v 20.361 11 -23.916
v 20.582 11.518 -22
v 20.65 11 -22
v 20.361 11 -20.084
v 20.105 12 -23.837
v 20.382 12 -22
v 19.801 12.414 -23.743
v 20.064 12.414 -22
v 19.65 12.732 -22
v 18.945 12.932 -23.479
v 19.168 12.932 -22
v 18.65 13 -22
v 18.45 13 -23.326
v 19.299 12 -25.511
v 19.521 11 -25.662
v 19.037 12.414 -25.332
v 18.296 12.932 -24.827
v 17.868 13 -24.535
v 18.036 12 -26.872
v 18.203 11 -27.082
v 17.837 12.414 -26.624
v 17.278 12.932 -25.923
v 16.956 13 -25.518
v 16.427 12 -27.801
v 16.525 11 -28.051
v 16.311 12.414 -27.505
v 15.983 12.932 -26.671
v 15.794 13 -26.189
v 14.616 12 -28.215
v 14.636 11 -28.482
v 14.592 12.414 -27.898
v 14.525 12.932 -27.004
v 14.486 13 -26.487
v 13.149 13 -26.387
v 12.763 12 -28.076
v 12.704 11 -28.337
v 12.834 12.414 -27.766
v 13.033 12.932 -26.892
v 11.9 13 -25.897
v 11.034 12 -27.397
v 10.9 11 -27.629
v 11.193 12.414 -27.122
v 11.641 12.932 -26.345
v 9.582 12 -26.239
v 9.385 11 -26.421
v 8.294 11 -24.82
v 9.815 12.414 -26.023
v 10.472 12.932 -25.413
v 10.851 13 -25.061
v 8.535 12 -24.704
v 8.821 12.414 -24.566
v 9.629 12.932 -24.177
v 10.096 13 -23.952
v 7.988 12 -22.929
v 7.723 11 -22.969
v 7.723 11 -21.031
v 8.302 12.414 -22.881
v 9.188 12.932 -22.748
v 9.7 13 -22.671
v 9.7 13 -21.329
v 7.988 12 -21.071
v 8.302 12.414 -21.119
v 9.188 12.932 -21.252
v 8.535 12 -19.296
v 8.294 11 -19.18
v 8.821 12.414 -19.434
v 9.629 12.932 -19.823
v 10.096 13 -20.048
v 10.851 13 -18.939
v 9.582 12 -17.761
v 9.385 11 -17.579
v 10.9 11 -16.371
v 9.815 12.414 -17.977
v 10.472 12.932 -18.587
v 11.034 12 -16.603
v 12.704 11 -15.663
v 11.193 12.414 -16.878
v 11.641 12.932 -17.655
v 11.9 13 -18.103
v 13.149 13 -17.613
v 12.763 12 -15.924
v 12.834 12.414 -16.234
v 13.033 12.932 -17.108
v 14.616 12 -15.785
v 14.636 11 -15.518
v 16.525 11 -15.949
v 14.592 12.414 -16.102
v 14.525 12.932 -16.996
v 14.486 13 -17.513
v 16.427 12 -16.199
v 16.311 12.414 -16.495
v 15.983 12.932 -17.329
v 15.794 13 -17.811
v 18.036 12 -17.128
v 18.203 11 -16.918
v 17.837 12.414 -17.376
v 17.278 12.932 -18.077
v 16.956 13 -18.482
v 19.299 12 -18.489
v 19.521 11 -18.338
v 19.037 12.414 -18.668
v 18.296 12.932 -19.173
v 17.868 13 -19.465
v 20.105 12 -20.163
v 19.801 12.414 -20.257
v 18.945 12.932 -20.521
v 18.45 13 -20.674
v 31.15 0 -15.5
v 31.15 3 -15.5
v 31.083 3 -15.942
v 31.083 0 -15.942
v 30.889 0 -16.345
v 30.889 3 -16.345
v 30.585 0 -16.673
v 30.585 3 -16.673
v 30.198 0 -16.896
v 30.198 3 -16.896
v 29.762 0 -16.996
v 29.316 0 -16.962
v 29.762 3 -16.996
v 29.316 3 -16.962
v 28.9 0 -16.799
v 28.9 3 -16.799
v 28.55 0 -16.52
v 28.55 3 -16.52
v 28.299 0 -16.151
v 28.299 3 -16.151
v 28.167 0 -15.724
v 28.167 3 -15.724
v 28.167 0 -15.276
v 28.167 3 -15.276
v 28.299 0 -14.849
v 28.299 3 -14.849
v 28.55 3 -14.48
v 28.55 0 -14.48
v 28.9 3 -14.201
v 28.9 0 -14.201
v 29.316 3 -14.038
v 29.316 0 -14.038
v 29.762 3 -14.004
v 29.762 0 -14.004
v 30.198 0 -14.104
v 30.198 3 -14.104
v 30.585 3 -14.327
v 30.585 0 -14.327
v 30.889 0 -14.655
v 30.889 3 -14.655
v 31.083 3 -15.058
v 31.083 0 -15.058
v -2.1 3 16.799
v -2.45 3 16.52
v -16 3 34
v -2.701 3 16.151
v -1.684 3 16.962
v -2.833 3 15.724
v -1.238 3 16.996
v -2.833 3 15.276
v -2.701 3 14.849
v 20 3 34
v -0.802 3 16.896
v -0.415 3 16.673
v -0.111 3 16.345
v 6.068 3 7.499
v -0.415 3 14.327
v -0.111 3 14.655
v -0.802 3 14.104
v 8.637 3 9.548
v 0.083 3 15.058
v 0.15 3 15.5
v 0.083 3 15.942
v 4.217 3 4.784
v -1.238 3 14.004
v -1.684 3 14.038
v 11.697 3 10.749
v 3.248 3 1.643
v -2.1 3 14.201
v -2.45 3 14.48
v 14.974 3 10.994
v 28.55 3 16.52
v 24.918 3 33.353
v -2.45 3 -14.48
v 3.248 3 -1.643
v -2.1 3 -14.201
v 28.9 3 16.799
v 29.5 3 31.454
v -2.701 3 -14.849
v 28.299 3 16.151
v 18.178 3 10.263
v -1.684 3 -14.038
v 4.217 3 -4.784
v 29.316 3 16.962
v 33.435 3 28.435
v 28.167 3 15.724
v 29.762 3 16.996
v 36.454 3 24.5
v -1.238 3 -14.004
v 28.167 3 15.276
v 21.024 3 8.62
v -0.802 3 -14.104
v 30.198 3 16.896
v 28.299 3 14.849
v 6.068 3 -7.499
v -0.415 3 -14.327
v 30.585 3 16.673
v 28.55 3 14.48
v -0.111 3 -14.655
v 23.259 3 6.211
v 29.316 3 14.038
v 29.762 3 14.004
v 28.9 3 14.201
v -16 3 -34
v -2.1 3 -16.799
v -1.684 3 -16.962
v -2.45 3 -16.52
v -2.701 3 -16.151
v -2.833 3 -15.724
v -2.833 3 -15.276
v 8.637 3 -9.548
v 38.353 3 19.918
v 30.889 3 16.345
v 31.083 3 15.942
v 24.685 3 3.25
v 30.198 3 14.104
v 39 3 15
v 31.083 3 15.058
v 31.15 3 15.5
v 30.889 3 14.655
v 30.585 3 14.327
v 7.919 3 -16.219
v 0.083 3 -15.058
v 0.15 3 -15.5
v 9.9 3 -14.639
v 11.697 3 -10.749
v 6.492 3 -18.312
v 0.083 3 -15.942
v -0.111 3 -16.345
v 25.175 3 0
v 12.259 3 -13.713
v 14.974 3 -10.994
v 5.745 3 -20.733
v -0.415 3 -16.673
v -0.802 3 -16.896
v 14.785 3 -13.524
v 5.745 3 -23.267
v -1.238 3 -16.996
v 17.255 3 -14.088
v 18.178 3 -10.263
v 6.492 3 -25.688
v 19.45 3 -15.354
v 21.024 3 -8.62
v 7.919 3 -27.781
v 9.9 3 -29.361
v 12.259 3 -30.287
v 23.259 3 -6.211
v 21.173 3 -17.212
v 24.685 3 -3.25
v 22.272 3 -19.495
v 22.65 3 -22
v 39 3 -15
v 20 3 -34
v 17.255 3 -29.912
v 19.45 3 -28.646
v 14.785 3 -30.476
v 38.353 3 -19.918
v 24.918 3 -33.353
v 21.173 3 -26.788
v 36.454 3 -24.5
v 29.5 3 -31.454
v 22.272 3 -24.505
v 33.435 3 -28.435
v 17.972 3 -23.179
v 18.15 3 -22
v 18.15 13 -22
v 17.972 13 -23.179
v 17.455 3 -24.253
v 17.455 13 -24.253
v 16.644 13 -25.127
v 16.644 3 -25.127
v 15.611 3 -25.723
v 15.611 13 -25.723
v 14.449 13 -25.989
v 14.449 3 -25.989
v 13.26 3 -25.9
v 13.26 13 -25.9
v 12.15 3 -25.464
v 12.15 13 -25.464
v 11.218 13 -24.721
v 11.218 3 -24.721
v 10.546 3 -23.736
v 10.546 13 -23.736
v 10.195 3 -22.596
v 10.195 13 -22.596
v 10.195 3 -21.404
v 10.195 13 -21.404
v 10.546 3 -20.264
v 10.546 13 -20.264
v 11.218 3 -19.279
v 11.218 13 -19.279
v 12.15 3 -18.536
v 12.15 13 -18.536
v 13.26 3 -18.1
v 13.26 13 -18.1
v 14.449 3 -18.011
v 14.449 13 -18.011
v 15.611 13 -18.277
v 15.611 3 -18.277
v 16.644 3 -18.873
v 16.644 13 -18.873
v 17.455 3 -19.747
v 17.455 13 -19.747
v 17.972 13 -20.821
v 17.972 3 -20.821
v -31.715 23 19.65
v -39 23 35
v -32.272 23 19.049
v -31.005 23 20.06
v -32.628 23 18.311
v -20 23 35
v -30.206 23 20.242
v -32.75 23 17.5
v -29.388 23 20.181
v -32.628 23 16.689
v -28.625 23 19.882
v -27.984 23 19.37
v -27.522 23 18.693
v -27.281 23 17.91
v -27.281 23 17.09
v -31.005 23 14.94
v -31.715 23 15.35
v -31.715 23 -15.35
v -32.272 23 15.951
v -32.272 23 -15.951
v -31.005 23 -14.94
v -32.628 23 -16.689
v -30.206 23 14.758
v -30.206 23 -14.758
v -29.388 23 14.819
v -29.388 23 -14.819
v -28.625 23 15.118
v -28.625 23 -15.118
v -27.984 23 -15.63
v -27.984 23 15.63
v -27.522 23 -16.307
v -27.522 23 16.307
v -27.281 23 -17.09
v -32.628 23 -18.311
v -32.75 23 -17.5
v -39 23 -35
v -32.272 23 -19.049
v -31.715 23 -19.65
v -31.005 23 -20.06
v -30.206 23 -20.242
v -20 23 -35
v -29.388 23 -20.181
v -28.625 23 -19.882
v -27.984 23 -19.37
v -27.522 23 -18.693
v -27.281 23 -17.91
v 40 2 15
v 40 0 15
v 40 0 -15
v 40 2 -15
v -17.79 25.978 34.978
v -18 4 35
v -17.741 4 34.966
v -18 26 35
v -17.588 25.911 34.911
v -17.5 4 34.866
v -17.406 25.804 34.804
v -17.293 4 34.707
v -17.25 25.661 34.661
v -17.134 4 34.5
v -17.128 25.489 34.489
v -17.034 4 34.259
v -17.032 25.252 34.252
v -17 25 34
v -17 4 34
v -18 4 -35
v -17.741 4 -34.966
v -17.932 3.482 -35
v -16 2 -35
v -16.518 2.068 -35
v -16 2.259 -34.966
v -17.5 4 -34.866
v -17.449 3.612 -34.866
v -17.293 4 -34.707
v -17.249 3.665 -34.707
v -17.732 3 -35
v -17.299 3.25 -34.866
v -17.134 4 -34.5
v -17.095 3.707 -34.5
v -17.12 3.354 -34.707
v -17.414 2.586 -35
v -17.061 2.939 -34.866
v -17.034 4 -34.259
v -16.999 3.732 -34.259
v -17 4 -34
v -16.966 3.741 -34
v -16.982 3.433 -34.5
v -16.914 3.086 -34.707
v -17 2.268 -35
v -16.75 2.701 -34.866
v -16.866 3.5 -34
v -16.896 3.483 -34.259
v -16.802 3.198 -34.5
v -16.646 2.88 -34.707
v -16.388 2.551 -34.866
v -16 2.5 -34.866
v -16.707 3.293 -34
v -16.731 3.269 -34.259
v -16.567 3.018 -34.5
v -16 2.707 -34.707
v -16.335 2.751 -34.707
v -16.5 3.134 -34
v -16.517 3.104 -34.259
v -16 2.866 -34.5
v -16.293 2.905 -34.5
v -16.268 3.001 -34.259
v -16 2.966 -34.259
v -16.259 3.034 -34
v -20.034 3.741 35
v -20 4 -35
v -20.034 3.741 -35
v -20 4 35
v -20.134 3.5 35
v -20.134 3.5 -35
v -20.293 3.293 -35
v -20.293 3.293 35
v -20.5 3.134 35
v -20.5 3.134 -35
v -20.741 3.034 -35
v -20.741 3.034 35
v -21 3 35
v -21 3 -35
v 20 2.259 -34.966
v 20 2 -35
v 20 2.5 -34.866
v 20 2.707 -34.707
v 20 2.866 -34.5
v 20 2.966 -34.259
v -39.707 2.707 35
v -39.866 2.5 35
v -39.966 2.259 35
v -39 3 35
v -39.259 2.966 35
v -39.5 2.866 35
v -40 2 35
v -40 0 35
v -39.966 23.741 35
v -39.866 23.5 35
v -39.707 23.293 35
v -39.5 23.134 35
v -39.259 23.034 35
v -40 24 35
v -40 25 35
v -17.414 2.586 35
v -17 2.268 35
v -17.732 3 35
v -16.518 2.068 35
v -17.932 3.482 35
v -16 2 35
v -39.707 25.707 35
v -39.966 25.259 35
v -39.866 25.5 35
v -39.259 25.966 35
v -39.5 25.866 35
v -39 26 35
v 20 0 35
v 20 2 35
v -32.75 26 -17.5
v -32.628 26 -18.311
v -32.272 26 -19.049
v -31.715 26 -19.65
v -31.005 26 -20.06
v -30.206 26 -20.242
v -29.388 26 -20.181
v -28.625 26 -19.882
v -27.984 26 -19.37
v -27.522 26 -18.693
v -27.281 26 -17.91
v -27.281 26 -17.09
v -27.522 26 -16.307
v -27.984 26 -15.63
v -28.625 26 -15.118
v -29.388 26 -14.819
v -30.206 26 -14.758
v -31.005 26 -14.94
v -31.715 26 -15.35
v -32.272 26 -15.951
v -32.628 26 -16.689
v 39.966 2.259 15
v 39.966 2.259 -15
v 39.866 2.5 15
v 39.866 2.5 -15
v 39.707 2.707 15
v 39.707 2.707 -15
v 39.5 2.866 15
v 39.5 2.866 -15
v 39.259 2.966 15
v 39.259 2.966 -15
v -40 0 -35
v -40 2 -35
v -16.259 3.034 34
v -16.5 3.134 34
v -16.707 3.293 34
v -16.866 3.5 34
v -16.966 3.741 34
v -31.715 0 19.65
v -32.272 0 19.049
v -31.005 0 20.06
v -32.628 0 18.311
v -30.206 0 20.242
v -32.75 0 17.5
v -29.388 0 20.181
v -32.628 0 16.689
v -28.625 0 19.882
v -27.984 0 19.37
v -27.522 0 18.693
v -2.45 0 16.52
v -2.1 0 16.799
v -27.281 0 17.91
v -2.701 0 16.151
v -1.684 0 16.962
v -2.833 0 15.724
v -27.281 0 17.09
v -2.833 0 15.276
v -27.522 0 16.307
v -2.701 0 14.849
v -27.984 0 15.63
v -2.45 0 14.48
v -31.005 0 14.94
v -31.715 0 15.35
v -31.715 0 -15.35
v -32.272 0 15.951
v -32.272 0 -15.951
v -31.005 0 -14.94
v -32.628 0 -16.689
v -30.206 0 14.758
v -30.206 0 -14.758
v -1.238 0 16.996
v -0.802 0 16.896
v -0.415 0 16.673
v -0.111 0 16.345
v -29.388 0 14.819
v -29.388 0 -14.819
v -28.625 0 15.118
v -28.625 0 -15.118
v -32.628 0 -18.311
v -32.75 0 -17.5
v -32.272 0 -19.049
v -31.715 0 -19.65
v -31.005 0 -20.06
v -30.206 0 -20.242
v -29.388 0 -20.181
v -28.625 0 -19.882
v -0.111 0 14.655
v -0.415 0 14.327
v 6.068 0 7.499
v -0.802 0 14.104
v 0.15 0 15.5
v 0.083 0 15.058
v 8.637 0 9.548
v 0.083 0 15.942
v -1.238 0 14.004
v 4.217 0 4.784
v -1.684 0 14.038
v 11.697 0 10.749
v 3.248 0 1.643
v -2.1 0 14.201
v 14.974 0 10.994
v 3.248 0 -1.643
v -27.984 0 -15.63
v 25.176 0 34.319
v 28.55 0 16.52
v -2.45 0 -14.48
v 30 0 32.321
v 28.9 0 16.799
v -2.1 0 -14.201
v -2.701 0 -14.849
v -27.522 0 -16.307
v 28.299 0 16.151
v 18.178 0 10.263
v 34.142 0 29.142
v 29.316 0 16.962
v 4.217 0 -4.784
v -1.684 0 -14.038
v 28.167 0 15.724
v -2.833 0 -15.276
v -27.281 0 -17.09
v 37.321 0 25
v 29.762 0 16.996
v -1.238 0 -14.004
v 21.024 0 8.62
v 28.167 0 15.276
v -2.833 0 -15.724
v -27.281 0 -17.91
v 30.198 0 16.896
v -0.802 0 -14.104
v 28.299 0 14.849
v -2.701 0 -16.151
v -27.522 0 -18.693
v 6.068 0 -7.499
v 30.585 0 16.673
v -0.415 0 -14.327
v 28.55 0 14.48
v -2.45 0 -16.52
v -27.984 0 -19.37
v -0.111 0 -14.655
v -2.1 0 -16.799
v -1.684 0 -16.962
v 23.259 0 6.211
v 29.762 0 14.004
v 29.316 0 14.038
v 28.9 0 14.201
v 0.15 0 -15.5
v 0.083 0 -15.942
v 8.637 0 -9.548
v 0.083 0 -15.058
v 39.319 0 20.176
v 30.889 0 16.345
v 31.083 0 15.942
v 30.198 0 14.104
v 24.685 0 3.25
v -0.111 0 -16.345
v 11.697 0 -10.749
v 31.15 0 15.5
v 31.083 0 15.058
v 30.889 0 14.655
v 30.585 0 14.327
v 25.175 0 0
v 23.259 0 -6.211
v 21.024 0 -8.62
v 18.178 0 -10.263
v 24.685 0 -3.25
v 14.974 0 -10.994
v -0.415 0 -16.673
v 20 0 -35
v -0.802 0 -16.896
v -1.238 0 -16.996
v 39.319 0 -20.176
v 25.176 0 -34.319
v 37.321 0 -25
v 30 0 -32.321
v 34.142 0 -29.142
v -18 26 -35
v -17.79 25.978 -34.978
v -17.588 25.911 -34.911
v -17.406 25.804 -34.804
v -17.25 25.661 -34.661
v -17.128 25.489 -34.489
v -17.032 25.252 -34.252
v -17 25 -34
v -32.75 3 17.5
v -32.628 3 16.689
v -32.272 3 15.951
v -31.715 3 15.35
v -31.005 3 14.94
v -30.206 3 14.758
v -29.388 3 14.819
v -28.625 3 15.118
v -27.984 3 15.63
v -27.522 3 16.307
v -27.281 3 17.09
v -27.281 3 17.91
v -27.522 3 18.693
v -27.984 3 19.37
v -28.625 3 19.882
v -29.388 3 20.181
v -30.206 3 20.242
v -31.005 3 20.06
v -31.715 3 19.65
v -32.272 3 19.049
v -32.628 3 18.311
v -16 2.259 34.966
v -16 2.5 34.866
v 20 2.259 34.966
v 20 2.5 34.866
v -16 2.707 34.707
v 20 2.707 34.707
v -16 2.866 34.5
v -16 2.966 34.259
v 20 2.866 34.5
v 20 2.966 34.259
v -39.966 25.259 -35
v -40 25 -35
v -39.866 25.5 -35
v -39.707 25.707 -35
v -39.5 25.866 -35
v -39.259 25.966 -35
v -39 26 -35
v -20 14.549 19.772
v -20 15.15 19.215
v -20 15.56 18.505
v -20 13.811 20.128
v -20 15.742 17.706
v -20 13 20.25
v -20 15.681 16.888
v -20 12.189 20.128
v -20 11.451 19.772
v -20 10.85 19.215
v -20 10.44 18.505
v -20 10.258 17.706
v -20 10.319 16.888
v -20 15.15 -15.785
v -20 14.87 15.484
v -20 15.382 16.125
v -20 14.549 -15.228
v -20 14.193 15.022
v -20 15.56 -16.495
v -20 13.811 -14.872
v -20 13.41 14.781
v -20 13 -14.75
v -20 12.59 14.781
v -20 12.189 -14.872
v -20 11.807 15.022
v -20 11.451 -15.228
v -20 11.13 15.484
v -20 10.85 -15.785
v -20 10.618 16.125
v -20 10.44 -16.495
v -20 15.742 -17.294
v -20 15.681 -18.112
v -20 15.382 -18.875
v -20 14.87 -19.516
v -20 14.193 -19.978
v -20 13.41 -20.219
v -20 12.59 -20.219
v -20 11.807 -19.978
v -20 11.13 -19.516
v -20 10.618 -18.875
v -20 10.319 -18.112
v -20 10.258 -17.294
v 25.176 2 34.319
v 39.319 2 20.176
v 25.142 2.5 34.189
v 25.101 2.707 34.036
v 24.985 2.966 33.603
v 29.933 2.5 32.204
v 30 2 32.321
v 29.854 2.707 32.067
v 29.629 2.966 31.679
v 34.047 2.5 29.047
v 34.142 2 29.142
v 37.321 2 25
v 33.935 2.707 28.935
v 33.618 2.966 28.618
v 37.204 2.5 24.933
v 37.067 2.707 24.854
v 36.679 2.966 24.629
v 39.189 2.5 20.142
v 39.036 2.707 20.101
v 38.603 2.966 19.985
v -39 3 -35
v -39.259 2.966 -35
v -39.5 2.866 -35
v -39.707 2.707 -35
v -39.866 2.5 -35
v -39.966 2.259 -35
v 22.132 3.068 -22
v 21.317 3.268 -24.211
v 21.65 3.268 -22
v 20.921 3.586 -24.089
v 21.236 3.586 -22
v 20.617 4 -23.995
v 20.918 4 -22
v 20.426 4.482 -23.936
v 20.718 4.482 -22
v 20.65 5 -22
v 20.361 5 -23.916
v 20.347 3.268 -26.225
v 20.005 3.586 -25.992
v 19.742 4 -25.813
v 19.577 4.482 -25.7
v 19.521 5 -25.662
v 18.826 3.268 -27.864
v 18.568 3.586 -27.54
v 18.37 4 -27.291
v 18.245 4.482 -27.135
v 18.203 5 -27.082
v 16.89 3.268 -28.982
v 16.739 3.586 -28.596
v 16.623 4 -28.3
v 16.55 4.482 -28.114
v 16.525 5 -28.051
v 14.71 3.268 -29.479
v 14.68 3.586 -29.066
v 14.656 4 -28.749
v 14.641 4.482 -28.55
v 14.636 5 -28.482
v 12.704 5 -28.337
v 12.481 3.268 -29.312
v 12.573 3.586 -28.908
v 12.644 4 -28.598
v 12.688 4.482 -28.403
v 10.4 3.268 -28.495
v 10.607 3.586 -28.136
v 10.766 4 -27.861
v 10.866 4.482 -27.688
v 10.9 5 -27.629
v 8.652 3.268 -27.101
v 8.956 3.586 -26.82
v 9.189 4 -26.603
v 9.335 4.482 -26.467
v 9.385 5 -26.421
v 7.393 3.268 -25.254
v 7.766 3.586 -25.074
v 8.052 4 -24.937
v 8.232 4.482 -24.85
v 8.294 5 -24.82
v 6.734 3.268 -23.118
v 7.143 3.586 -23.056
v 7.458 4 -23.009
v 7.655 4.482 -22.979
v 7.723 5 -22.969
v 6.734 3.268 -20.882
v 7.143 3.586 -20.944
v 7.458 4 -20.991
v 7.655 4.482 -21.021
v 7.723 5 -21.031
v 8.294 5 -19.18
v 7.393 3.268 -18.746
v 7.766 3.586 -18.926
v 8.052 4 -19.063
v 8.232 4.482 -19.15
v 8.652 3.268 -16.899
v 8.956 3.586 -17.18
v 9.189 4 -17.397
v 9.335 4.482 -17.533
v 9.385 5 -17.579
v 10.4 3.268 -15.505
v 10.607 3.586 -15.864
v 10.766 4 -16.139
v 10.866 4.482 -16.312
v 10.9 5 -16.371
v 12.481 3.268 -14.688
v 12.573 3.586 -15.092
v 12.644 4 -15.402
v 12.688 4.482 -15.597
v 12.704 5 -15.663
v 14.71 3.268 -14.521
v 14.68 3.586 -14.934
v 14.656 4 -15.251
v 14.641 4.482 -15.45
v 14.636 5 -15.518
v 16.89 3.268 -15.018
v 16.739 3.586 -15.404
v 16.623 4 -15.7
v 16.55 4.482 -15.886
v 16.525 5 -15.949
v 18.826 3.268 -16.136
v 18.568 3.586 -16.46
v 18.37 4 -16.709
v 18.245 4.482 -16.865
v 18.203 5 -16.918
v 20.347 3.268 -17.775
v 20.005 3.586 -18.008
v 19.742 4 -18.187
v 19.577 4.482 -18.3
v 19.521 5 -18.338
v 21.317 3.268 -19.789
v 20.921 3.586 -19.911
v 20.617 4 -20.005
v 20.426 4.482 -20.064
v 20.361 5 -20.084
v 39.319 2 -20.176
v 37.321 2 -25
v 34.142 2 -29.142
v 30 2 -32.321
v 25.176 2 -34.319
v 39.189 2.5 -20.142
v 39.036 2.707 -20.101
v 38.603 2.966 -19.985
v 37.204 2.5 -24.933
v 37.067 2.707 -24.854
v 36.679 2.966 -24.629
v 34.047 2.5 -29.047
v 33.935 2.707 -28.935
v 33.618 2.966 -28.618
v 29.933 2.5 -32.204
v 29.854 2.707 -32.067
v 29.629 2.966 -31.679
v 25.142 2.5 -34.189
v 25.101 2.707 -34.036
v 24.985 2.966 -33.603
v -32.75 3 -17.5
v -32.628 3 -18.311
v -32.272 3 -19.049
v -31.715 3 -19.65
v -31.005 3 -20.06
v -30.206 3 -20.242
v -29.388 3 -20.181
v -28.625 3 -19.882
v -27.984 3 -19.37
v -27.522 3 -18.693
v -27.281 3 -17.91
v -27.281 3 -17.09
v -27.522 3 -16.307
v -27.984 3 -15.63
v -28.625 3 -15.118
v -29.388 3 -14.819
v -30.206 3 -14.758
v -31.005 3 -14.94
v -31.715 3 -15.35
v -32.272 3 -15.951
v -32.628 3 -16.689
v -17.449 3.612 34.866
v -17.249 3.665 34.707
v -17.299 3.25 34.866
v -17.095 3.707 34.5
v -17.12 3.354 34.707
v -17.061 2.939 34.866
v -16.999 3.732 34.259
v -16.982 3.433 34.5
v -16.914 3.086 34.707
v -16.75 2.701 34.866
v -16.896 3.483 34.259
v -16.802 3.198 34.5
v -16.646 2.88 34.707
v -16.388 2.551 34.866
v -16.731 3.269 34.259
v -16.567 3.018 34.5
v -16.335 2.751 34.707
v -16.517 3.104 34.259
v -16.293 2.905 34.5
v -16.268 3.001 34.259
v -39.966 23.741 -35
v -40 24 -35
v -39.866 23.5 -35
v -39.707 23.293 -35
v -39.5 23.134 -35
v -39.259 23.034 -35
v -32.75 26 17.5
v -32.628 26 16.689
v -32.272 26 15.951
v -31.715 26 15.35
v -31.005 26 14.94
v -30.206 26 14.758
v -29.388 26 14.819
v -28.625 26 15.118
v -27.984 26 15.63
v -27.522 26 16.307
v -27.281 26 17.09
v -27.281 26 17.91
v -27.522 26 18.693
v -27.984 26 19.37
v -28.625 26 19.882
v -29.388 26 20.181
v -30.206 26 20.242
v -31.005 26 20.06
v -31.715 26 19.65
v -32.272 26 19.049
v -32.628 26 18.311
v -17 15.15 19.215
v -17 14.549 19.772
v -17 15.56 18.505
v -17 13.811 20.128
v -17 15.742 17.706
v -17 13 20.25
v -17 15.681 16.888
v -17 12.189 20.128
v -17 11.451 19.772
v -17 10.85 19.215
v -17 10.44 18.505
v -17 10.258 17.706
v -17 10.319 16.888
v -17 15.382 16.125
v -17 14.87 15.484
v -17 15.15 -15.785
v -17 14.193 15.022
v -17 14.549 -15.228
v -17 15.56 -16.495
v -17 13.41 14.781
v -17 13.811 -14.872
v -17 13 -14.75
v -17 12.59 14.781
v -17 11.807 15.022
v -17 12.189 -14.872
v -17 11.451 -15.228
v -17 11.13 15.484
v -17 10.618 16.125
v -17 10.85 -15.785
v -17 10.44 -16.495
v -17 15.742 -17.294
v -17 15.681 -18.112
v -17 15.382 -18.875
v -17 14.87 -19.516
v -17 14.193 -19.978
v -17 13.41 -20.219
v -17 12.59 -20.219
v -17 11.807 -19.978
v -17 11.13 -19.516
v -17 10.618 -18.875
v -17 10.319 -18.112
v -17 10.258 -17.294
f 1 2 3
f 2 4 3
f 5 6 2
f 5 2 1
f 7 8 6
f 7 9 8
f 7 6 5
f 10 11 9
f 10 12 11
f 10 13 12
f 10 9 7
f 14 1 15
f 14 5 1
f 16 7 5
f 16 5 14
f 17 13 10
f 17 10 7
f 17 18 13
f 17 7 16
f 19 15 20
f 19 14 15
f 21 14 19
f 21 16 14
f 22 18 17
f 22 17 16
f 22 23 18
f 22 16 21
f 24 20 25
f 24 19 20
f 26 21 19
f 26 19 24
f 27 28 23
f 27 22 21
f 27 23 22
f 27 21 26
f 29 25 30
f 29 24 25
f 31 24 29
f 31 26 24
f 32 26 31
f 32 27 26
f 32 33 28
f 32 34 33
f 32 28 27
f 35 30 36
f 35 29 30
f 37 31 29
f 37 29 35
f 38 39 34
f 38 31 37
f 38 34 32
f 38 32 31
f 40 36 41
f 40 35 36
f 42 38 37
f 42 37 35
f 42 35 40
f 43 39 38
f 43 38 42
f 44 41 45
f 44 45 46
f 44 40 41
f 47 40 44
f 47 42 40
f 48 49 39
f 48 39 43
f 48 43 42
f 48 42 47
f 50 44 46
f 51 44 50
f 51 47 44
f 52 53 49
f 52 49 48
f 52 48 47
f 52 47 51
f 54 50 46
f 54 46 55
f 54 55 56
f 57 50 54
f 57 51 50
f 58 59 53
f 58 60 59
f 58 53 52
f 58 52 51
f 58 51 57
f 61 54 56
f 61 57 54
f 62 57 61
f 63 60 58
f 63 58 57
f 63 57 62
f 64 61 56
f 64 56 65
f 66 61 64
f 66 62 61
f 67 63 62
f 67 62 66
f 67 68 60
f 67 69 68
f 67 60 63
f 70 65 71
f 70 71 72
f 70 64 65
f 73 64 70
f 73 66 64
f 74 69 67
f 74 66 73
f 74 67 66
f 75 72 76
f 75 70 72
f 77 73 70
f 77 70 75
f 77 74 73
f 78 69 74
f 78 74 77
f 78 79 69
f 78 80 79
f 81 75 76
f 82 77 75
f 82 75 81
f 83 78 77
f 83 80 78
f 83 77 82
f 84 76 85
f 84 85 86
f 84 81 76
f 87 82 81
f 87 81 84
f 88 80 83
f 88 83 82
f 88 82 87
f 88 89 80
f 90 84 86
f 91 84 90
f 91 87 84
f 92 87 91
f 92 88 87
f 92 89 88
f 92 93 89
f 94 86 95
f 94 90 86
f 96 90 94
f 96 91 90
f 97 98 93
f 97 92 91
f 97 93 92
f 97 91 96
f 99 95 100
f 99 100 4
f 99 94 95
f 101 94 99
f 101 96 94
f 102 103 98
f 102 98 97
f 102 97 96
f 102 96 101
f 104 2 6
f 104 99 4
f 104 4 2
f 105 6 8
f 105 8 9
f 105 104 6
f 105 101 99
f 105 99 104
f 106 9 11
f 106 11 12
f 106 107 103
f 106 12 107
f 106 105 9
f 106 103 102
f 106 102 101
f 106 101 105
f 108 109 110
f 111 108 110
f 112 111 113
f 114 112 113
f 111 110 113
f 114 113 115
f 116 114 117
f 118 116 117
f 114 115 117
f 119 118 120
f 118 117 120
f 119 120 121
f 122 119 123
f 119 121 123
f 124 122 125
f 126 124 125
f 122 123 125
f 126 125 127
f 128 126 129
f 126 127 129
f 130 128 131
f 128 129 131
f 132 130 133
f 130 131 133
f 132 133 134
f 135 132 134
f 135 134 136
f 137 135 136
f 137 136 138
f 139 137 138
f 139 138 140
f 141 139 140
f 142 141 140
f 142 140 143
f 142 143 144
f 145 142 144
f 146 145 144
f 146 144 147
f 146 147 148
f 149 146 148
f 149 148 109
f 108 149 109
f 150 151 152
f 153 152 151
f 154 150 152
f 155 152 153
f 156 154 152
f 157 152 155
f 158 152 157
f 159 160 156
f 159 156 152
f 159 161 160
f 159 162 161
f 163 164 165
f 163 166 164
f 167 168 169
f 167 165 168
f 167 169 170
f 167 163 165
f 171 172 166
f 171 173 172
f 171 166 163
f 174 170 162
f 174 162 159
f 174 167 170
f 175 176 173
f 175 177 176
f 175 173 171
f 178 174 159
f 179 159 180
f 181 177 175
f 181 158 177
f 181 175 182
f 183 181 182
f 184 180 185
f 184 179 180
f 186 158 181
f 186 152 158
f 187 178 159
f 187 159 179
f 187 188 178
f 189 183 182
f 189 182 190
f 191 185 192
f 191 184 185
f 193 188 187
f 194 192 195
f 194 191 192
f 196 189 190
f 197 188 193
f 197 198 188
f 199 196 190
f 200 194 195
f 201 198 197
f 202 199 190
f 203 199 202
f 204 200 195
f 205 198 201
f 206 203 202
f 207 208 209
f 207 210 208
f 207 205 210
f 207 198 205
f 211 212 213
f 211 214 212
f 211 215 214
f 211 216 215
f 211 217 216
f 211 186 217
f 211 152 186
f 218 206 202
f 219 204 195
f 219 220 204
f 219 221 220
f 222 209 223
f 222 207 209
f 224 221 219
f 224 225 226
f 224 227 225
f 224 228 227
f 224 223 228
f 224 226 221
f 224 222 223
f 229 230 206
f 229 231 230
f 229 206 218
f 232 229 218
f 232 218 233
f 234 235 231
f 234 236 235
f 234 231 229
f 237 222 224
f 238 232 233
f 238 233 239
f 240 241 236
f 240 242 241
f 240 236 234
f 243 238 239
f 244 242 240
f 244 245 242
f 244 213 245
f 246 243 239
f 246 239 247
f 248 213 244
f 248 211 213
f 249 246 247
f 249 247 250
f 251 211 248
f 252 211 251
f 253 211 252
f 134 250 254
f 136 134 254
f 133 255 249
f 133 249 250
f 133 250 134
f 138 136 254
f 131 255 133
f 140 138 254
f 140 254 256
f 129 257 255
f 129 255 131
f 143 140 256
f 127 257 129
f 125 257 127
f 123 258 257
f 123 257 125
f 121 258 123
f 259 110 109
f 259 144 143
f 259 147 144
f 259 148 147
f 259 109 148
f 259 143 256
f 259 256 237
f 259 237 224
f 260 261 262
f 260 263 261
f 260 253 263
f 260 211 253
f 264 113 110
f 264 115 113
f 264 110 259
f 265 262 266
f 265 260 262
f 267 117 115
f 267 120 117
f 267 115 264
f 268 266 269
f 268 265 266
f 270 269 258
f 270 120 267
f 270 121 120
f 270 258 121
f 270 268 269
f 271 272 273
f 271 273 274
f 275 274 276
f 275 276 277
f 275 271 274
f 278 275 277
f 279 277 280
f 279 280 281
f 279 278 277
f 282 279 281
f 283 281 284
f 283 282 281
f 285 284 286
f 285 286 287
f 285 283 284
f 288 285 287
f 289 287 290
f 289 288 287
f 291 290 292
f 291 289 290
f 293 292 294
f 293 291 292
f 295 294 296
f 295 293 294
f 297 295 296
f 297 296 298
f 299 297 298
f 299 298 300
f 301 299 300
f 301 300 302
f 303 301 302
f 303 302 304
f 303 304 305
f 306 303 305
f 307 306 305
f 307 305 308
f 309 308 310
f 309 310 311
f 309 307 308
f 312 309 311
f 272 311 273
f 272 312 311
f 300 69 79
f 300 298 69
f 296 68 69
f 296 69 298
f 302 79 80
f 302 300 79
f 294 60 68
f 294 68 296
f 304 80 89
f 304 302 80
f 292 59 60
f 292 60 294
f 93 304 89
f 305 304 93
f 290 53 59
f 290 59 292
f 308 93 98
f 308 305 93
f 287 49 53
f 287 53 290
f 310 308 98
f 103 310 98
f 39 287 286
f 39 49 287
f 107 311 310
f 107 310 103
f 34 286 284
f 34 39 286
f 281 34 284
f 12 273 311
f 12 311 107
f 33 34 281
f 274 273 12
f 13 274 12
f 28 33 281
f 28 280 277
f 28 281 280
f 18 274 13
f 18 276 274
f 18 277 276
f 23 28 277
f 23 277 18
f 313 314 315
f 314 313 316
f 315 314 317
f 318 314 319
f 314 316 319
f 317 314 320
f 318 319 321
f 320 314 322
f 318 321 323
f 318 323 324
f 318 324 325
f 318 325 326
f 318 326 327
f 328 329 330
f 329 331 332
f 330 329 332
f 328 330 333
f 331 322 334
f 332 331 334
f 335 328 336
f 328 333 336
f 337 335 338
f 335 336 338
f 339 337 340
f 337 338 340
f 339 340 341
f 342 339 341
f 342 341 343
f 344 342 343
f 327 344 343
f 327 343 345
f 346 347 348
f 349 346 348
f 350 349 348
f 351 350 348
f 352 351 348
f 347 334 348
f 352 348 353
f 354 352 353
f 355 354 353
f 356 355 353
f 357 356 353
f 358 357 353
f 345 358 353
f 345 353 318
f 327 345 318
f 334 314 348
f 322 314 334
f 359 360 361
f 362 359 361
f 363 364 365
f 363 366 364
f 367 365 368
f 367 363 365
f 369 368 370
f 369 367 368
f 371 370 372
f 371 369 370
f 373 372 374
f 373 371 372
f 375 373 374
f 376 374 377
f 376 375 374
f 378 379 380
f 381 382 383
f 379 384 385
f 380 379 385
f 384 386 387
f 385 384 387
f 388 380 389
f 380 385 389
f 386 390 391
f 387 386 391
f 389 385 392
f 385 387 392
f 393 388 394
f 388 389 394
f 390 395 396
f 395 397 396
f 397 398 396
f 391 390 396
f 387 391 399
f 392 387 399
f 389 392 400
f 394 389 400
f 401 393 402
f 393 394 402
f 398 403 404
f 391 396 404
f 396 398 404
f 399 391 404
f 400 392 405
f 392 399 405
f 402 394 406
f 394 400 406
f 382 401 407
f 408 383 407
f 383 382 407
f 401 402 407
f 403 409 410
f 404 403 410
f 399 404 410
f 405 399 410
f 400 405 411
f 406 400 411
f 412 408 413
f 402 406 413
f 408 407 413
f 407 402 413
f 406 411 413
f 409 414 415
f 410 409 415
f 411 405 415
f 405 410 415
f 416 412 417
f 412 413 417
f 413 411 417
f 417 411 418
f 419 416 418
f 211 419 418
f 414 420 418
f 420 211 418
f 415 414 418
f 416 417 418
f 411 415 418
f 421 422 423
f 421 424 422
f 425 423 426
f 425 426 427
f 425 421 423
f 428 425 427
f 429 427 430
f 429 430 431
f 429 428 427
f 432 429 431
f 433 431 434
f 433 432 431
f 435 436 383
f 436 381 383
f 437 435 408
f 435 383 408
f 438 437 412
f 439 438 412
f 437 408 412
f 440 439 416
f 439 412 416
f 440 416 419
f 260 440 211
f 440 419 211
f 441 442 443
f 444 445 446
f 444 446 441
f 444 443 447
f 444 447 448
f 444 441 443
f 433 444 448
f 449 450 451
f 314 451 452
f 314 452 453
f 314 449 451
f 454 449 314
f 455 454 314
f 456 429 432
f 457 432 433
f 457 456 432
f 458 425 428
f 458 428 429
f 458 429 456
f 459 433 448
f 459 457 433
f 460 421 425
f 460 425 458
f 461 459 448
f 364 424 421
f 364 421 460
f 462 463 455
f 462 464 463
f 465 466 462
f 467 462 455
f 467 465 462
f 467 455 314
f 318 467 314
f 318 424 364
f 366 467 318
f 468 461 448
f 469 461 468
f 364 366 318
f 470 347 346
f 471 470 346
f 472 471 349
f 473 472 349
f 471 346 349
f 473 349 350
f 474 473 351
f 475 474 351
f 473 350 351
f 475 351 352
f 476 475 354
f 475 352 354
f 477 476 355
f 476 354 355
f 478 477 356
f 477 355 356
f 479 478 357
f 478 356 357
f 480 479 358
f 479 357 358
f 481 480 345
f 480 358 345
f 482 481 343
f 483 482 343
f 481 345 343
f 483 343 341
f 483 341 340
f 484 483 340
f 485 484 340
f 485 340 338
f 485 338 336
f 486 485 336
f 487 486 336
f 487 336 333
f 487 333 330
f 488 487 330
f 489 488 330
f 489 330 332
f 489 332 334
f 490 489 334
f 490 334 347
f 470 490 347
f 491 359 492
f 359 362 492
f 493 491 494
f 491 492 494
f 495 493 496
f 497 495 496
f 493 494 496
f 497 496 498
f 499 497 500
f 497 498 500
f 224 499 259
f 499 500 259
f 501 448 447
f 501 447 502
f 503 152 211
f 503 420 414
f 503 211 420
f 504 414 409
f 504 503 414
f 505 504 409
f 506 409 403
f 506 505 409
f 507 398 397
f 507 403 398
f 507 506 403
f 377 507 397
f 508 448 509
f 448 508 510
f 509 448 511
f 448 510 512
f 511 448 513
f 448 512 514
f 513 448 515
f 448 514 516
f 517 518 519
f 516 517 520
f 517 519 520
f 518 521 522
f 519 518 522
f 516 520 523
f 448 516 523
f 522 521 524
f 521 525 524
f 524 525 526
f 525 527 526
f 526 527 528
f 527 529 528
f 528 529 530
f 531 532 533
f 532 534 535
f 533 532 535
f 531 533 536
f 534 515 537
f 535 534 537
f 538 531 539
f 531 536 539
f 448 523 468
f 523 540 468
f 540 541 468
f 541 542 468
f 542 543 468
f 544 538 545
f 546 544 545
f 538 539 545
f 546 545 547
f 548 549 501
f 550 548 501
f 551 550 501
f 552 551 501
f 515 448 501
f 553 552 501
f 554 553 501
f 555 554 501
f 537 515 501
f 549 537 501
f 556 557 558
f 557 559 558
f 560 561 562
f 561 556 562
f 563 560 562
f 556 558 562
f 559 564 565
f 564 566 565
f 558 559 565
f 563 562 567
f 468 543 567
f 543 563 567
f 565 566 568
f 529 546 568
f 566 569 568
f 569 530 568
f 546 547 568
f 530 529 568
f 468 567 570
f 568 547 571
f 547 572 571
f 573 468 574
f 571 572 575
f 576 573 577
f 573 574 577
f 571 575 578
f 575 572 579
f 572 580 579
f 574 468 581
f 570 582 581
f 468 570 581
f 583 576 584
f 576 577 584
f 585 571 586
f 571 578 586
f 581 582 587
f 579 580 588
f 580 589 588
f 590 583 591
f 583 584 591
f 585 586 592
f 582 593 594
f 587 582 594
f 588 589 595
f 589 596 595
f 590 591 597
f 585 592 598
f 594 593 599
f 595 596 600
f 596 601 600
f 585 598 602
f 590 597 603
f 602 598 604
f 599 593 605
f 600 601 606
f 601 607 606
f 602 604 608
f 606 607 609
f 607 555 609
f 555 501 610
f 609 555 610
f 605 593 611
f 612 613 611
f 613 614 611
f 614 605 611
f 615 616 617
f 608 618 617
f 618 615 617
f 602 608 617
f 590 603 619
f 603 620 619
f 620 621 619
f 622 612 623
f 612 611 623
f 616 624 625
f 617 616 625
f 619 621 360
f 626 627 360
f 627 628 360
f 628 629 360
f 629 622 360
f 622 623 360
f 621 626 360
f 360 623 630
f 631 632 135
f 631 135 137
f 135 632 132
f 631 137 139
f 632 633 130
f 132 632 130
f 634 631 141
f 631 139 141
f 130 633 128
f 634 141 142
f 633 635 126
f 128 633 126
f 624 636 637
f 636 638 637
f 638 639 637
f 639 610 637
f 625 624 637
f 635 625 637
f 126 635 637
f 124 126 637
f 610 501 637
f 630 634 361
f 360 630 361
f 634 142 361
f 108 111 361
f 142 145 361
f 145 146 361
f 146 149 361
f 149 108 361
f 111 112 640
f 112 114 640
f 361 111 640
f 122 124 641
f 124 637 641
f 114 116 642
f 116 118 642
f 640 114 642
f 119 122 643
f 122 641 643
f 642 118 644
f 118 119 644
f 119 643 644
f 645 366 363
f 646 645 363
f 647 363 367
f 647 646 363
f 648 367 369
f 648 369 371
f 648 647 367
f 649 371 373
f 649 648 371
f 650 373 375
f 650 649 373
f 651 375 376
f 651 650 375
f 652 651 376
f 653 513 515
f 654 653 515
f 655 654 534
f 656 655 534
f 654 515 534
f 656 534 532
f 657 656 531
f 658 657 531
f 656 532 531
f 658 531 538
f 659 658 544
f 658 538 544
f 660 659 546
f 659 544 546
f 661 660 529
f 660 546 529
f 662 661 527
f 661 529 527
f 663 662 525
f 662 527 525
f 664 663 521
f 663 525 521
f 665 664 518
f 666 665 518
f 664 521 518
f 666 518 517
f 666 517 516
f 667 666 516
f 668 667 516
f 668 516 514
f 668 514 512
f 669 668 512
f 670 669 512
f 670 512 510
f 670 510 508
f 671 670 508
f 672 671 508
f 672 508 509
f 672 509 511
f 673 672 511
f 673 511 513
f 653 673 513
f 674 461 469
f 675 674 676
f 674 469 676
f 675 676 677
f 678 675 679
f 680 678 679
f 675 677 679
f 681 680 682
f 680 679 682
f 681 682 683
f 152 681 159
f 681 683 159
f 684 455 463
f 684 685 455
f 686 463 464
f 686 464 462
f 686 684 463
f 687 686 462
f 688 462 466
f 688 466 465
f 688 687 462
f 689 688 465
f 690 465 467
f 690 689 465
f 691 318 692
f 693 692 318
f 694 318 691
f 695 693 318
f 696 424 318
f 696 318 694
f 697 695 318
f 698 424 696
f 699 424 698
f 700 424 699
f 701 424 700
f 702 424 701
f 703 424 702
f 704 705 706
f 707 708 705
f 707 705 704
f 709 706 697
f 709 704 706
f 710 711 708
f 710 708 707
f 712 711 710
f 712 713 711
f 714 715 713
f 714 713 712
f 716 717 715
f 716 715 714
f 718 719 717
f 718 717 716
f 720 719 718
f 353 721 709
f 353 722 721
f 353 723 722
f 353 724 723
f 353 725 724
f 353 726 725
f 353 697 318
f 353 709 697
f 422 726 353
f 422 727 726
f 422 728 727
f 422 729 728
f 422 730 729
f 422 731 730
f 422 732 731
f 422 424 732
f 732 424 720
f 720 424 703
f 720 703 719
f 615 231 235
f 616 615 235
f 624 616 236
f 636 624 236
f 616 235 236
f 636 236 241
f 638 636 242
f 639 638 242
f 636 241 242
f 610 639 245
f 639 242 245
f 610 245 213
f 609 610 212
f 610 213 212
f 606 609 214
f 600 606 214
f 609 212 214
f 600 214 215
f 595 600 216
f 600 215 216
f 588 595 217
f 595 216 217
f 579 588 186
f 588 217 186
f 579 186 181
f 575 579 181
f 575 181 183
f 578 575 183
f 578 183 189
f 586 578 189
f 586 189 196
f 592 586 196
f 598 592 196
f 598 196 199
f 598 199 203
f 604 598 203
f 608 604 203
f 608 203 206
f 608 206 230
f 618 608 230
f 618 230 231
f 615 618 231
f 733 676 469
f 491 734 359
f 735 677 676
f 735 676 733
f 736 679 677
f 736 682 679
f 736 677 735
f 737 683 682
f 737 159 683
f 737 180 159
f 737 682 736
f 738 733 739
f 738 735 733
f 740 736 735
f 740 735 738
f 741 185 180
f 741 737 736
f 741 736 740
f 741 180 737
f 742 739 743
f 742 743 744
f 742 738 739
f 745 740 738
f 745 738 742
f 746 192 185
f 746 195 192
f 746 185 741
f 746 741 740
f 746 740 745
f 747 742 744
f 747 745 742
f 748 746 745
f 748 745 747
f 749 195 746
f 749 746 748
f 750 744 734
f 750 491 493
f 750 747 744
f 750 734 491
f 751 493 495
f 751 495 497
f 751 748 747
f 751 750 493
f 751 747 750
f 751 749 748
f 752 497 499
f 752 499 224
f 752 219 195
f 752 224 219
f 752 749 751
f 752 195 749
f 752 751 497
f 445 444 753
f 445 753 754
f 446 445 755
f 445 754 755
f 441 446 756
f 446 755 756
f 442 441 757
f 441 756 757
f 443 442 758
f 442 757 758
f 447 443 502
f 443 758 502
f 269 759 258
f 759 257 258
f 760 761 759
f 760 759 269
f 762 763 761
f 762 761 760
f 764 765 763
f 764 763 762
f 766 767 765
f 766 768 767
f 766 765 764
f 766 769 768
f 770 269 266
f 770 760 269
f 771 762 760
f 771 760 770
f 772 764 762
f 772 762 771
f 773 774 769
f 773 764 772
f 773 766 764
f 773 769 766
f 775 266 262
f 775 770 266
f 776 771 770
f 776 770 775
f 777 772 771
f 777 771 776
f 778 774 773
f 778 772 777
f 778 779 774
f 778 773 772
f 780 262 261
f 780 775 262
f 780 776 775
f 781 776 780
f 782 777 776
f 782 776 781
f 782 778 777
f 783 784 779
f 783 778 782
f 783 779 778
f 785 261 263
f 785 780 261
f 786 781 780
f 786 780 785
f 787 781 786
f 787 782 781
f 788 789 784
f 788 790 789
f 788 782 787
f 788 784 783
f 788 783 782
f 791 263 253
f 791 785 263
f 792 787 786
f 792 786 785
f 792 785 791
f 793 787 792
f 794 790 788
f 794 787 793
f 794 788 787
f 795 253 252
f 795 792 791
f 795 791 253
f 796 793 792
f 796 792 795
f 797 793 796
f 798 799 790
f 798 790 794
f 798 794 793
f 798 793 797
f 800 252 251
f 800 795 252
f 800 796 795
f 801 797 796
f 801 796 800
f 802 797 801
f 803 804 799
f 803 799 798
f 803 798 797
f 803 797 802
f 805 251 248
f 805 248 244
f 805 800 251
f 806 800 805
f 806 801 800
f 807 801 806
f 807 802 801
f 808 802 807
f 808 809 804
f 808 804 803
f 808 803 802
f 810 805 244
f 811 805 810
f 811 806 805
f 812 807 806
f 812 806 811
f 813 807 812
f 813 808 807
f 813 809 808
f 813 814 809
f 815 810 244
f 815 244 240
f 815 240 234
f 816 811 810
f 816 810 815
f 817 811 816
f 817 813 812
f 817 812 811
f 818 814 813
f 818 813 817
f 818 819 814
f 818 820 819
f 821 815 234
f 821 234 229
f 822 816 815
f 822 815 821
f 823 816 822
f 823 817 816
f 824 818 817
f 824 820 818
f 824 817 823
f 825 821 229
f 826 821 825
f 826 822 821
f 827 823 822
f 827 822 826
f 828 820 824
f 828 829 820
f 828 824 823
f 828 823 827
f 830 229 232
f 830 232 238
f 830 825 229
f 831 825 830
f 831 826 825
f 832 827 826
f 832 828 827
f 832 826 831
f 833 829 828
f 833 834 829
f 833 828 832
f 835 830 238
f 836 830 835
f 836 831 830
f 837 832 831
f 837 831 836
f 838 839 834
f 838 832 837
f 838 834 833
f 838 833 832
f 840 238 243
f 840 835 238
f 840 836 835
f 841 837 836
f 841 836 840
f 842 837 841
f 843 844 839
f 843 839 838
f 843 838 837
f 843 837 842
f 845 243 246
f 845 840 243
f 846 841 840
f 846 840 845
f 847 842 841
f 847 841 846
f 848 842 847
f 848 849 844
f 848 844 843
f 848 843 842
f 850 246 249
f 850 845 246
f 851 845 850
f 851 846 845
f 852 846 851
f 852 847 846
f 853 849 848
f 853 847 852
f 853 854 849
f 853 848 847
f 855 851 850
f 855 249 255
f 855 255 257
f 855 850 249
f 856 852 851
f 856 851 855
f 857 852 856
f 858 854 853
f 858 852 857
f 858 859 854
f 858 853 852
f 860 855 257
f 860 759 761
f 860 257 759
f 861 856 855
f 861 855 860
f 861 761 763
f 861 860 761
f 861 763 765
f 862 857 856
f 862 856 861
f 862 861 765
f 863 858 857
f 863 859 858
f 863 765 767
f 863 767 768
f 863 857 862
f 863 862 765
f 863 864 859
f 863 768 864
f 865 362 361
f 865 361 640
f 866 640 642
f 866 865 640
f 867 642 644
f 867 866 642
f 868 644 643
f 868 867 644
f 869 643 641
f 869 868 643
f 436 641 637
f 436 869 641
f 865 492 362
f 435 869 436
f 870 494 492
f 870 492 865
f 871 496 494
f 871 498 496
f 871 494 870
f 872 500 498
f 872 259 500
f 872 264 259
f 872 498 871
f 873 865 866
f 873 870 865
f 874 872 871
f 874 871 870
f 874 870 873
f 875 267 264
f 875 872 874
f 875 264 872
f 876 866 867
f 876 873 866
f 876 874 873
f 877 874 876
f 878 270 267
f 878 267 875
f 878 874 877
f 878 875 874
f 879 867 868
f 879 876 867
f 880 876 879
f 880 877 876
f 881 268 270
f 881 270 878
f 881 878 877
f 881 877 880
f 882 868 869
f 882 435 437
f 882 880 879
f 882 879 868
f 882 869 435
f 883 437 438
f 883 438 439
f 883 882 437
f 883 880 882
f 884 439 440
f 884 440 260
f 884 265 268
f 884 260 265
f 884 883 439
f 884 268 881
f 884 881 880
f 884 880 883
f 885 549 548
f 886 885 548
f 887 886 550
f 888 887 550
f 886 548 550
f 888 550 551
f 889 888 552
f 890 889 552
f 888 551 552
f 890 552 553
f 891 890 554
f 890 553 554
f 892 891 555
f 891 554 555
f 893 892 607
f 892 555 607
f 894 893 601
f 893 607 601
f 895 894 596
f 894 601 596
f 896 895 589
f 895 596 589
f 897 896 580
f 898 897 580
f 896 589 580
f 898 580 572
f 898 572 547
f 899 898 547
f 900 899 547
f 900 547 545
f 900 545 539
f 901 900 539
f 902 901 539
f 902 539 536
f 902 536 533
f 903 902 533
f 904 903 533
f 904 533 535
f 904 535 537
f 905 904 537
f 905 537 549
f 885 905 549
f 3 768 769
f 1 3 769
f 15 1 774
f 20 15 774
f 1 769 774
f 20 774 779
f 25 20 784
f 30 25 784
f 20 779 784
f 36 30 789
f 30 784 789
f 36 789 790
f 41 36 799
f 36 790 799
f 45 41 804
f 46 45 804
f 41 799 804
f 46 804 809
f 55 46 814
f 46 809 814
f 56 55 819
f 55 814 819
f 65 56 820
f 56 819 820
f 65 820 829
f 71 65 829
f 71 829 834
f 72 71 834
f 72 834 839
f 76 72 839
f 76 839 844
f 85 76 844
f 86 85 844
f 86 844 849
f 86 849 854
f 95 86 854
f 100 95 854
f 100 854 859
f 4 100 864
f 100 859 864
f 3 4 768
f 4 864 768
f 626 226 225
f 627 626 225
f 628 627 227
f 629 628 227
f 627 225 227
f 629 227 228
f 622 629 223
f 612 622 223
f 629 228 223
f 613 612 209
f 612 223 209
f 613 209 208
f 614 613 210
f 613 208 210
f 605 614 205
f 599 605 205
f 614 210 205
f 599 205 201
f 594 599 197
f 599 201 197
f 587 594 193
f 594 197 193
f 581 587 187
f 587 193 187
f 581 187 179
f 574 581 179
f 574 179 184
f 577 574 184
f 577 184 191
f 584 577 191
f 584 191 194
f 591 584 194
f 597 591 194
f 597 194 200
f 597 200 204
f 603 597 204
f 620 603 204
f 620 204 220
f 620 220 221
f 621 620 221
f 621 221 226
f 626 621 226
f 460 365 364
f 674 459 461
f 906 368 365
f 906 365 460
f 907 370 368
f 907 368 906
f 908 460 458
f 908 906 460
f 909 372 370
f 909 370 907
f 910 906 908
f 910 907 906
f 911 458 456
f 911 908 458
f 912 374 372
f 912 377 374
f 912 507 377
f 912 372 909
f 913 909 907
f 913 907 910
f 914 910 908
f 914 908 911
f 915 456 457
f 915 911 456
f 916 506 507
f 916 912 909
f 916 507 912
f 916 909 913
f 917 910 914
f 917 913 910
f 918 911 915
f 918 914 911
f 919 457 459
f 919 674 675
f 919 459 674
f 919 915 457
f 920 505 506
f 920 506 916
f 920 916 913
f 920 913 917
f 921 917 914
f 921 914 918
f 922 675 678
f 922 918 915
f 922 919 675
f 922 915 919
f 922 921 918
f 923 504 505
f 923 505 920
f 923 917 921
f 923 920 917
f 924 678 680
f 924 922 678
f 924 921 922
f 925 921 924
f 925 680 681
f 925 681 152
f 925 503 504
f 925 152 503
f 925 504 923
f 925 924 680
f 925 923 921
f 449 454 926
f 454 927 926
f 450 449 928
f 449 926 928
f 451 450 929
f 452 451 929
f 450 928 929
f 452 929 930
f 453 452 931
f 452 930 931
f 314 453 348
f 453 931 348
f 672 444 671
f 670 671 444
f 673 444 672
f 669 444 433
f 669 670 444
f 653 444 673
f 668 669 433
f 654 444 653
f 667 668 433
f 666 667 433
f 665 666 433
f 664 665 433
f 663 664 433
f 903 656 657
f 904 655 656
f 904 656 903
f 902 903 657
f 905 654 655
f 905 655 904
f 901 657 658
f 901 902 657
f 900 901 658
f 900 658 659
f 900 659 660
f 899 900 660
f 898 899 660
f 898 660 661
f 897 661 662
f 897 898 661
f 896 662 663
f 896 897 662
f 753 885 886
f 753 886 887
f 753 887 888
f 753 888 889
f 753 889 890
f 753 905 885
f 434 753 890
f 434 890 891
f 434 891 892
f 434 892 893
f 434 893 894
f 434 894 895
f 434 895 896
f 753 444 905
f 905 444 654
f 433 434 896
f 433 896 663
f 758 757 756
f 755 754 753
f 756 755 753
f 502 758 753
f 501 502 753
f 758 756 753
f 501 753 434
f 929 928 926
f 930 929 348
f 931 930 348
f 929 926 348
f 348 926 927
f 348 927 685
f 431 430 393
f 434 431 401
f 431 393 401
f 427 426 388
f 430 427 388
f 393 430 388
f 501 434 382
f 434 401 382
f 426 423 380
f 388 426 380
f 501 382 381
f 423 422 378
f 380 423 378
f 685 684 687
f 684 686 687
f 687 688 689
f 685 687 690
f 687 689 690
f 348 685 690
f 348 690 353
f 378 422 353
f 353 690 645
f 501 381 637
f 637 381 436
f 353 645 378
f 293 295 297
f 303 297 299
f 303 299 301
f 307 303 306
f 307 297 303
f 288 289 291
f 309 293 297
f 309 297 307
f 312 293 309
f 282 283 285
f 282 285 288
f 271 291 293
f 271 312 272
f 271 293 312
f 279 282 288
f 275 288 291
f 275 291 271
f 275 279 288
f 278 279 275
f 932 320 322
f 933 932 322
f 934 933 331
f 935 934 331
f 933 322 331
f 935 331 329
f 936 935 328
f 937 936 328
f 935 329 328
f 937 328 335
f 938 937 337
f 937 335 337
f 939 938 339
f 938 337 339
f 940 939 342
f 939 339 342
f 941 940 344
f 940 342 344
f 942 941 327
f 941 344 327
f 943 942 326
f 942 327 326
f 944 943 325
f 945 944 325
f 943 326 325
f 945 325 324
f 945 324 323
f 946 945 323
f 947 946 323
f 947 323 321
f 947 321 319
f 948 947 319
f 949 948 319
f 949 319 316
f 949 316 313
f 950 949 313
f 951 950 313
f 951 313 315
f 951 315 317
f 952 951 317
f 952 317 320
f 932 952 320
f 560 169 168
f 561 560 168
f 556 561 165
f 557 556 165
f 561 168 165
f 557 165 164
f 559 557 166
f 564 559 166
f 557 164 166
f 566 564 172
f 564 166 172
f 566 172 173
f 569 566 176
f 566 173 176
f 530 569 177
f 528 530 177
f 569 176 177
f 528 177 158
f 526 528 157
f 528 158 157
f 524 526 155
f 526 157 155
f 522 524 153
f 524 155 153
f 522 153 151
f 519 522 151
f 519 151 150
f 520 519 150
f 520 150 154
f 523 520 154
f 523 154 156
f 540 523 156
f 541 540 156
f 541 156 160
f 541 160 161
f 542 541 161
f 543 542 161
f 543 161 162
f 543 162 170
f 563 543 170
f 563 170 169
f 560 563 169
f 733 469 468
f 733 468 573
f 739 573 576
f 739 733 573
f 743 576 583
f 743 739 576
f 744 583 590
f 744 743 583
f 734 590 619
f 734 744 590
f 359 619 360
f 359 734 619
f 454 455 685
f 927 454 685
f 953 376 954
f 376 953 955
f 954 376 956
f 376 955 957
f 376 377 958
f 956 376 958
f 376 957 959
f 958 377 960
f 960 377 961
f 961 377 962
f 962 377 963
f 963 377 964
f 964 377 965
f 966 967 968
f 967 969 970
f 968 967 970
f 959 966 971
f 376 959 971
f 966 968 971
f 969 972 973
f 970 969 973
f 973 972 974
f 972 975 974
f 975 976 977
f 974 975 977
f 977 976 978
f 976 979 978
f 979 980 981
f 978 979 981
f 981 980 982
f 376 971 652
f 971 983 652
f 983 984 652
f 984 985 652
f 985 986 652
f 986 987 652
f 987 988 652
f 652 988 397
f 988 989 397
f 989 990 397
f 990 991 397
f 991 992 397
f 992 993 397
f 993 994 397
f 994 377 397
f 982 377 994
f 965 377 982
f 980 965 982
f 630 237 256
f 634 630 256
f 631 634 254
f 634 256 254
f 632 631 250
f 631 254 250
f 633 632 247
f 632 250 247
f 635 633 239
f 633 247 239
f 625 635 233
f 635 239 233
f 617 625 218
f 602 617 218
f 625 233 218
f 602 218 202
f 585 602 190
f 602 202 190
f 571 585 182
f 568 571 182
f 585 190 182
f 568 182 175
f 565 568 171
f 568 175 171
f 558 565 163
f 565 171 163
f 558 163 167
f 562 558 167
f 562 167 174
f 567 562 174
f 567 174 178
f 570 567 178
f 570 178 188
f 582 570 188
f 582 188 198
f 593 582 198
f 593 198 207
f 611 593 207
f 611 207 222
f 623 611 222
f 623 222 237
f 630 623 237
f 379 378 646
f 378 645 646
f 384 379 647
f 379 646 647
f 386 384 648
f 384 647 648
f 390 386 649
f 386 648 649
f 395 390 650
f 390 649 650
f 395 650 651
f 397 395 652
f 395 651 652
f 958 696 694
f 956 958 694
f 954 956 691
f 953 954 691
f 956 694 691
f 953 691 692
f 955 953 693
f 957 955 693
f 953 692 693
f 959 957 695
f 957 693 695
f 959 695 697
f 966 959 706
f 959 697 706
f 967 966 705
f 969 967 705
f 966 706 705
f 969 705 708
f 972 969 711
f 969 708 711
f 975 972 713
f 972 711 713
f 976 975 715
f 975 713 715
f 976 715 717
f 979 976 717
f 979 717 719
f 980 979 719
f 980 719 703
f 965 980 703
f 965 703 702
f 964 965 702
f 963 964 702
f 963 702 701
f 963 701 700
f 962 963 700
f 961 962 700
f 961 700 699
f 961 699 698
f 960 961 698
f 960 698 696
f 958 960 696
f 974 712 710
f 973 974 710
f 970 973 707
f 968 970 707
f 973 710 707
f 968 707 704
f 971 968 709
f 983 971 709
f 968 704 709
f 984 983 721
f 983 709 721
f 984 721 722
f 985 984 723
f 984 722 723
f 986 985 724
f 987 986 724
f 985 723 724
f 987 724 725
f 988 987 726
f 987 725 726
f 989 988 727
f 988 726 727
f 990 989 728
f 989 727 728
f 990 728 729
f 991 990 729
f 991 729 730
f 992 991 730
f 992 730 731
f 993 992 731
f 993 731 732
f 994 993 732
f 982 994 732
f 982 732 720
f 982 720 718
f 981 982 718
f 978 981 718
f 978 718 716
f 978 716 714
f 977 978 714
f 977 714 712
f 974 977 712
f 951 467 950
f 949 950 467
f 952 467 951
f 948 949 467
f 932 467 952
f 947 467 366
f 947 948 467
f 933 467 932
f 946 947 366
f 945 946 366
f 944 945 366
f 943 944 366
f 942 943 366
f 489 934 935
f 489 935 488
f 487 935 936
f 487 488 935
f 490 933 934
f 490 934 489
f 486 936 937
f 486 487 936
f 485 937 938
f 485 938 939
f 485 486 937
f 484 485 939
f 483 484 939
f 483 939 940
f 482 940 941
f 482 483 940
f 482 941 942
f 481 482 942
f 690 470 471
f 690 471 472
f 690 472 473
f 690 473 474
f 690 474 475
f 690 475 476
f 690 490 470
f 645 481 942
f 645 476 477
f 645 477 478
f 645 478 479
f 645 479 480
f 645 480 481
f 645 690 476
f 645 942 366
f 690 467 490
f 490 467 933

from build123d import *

# Parameters (mm, degrees)
SKETCH1_W                = 20
SKETCH1_H                = 70
SKETCH1_R                = 2.5
SKETCH1_W_2              = 57
SKETCH1_W_3              = 3
BOSS_EXTRUDE1_DEPTH      = 3
SKETCH1_3_W              = 3
SKETCH1_3_H              = 70
BOSS_EXTRUDE2_DEPTH      = 26
SKETCH2_R                = 2.5
CUT_EXTRUDE1_DEPTH       = 17
SKETCH3_R                = 1.5
SKETCH3_R_2              = 11.025
CUT_EXTRUDE2_DEPTH       = 10
FILLET1_R                = 20
BOSS_EXTRUDE4_START      = 26
SKETCH1_4_W              = 20
SKETCH1_4_H              = 70
SKETCH1_4_R              = 2.5
BOSS_EXTRUDE4_DEPTH      = 3
SKETCH4_R                = 6.5
SKETCH4_R_2              = 4
BOSS_EXTRUDE5_DEPTH      = 10
FILLET2_R                = 1
FILLET3_R                = 2
M5_CLEARANCE_HOLE1_D     = 5.5
M5_CLEARANCE_HOLE1_DEPTH = 23
M5_CLEARANCE_HOLE2_D     = 5.5


with BuildPart() as part:
    # Sketch1 → Boss-Extrude1 (new body)
    with BuildSketch(Plane(origin=(0, 0, 0), x_dir=(1, 0, 0), z_dir=(0, 1, 0))):
        with Locations((-30, 0)):
            Rectangle(SKETCH1_W, SKETCH1_H)
        with Locations((-30, -17.5)):
            Circle(SKETCH1_R, mode=Mode.SUBTRACT)
        with Locations((-30, 17.5)):
            Circle(SKETCH1_R, mode=Mode.SUBTRACT)
        with Locations((11.5, 0)):
            Rectangle(SKETCH1_W_2, SKETCH1_H)
        with Locations((-18.5, 0)):
            Rectangle(SKETCH1_W_3, SKETCH1_H)
    extrude(amount=BOSS_EXTRUDE1_DEPTH)

    # Sketch1<3> → Boss-Extrude2 (add)
    with BuildSketch(Plane(origin=(0, 0, 0), x_dir=(1, 0, 0), z_dir=(0, 1, 0))):
        with Locations((-18.5, 0)):
            Rectangle(SKETCH1_3_W, SKETCH1_3_H)
    extrude(amount=BOSS_EXTRUDE2_DEPTH)

    # Sketch2 → Cut-Extrude1 (cut)
    with BuildSketch(Plane(origin=(-17, 0, 0), x_dir=(0, 0, -1), z_dir=(1, 0, 0))):
        with Locations((-17.5, 13)):
            Circle(SKETCH2_R)
        with Locations((17.5, 13)):
            Circle(SKETCH2_R)
    extrude(amount=-CUT_EXTRUDE1_DEPTH, mode=Mode.SUBTRACT)

    # Sketch3 → Cut-Extrude2 (cut)
    with BuildSketch(Plane(origin=(0, 3, 0), x_dir=(1, 0, 0), z_dir=(0, 1, 0))):
        with Locations((-1.350000521, 15.500000521)):
            Circle(SKETCH3_R)
        with Locations((14.15, 0)):
            Circle(SKETCH3_R_2)
        with Locations((29.649999479, 15.499999479)):
            Circle(SKETCH3_R)
        with Locations((29.650000521, -15.500000521)):
            Circle(SKETCH3_R)
        with Locations((-1.349999479, -15.499999479)):
            Circle(SKETCH3_R)
    extrude(amount=-CUT_EXTRUDE2_DEPTH, mode=Mode.SUBTRACT)

    # Fillet1
    fillet1_edges = [part.edges().sort_by_distance(p)[0] for p in [
        (40, 1.5, -35),
        (40, 1.5, 35),
    ]]
    fillet(fillet1_edges, radius=FILLET1_R)

    # Sketch1<4> → Boss-Extrude4 (add)
    with BuildSketch(Plane(origin=(0, 0, 0), x_dir=(1, 0, 0), z_dir=(0, 1, 0)).offset(BOSS_EXTRUDE4_START)):
        with Locations((-30, 0)):
            Rectangle(SKETCH1_4_W, SKETCH1_4_H)
        with Locations((-30, -17.5)):
            Circle(SKETCH1_4_R, mode=Mode.SUBTRACT)
        with Locations((-30, 17.5)):
            Circle(SKETCH1_4_R, mode=Mode.SUBTRACT)
    extrude(amount=-BOSS_EXTRUDE4_DEPTH)

    # Sketch4 → Boss-Extrude5 (add)
    with BuildSketch(Plane(origin=(0, 3, 0), x_dir=(1, 0, 0), z_dir=(0, 1, 0))):
        with Locations((14.15, 22)):
            Circle(SKETCH4_R)
        with Locations((14.15, 22)):
            Circle(SKETCH4_R_2, mode=Mode.SUBTRACT)
    extrude(amount=BOSS_EXTRUDE5_DEPTH)

    # Fillet2
    fillet2_edges = [part.edges().sort_by_distance(p)[0] for p in [
        (-17, 14.5, -35),
        (-17, 14.5, 35),
        (1.5, 3, -35),
        (34.142135624, 3, -29.142135624),
        (40, 3, 0),
        (34.142135624, 3, 29.142135624),
        (-17, 3, 0),
        (-17, 26, 0),
        (1.5, 3, 35),
        (-20, 3, 0),
        (-40, 23, 0),
        (-40, 3, 0),
        (-40, 26, 0),
    ]]
    fillet(fillet2_edges, radius=FILLET2_R)

    # Fillet3
    fillet3_edges = [part.edges().sort_by_distance(p)[0] for p in [
        (7.65, 13, -22),
        (7.65, 3, -22),
    ]]
    fillet(fillet3_edges, radius=FILLET3_R)

    # M5 Clearance Hole1
    with Locations(Plane(origin=(-17, 0, 0), x_dir=(0, 0, -1), z_dir=(1, 0, 0))):
        with Locations((-17.5, 13), (17.5, 13)):
            Hole(M5_CLEARANCE_HOLE1_D / 2, depth=M5_CLEARANCE_HOLE1_DEPTH)

    # M5 Clearance Hole2 (through all)
    with Locations(Plane(origin=(0, 26, 0), x_dir=(1, 0, 0), z_dir=(0, 1, 0))):
        with Locations((-30, -17.5), (-30, 17.5)):
            Hole(M5_CLEARANCE_HOLE2_D / 2)


solid = part.part
